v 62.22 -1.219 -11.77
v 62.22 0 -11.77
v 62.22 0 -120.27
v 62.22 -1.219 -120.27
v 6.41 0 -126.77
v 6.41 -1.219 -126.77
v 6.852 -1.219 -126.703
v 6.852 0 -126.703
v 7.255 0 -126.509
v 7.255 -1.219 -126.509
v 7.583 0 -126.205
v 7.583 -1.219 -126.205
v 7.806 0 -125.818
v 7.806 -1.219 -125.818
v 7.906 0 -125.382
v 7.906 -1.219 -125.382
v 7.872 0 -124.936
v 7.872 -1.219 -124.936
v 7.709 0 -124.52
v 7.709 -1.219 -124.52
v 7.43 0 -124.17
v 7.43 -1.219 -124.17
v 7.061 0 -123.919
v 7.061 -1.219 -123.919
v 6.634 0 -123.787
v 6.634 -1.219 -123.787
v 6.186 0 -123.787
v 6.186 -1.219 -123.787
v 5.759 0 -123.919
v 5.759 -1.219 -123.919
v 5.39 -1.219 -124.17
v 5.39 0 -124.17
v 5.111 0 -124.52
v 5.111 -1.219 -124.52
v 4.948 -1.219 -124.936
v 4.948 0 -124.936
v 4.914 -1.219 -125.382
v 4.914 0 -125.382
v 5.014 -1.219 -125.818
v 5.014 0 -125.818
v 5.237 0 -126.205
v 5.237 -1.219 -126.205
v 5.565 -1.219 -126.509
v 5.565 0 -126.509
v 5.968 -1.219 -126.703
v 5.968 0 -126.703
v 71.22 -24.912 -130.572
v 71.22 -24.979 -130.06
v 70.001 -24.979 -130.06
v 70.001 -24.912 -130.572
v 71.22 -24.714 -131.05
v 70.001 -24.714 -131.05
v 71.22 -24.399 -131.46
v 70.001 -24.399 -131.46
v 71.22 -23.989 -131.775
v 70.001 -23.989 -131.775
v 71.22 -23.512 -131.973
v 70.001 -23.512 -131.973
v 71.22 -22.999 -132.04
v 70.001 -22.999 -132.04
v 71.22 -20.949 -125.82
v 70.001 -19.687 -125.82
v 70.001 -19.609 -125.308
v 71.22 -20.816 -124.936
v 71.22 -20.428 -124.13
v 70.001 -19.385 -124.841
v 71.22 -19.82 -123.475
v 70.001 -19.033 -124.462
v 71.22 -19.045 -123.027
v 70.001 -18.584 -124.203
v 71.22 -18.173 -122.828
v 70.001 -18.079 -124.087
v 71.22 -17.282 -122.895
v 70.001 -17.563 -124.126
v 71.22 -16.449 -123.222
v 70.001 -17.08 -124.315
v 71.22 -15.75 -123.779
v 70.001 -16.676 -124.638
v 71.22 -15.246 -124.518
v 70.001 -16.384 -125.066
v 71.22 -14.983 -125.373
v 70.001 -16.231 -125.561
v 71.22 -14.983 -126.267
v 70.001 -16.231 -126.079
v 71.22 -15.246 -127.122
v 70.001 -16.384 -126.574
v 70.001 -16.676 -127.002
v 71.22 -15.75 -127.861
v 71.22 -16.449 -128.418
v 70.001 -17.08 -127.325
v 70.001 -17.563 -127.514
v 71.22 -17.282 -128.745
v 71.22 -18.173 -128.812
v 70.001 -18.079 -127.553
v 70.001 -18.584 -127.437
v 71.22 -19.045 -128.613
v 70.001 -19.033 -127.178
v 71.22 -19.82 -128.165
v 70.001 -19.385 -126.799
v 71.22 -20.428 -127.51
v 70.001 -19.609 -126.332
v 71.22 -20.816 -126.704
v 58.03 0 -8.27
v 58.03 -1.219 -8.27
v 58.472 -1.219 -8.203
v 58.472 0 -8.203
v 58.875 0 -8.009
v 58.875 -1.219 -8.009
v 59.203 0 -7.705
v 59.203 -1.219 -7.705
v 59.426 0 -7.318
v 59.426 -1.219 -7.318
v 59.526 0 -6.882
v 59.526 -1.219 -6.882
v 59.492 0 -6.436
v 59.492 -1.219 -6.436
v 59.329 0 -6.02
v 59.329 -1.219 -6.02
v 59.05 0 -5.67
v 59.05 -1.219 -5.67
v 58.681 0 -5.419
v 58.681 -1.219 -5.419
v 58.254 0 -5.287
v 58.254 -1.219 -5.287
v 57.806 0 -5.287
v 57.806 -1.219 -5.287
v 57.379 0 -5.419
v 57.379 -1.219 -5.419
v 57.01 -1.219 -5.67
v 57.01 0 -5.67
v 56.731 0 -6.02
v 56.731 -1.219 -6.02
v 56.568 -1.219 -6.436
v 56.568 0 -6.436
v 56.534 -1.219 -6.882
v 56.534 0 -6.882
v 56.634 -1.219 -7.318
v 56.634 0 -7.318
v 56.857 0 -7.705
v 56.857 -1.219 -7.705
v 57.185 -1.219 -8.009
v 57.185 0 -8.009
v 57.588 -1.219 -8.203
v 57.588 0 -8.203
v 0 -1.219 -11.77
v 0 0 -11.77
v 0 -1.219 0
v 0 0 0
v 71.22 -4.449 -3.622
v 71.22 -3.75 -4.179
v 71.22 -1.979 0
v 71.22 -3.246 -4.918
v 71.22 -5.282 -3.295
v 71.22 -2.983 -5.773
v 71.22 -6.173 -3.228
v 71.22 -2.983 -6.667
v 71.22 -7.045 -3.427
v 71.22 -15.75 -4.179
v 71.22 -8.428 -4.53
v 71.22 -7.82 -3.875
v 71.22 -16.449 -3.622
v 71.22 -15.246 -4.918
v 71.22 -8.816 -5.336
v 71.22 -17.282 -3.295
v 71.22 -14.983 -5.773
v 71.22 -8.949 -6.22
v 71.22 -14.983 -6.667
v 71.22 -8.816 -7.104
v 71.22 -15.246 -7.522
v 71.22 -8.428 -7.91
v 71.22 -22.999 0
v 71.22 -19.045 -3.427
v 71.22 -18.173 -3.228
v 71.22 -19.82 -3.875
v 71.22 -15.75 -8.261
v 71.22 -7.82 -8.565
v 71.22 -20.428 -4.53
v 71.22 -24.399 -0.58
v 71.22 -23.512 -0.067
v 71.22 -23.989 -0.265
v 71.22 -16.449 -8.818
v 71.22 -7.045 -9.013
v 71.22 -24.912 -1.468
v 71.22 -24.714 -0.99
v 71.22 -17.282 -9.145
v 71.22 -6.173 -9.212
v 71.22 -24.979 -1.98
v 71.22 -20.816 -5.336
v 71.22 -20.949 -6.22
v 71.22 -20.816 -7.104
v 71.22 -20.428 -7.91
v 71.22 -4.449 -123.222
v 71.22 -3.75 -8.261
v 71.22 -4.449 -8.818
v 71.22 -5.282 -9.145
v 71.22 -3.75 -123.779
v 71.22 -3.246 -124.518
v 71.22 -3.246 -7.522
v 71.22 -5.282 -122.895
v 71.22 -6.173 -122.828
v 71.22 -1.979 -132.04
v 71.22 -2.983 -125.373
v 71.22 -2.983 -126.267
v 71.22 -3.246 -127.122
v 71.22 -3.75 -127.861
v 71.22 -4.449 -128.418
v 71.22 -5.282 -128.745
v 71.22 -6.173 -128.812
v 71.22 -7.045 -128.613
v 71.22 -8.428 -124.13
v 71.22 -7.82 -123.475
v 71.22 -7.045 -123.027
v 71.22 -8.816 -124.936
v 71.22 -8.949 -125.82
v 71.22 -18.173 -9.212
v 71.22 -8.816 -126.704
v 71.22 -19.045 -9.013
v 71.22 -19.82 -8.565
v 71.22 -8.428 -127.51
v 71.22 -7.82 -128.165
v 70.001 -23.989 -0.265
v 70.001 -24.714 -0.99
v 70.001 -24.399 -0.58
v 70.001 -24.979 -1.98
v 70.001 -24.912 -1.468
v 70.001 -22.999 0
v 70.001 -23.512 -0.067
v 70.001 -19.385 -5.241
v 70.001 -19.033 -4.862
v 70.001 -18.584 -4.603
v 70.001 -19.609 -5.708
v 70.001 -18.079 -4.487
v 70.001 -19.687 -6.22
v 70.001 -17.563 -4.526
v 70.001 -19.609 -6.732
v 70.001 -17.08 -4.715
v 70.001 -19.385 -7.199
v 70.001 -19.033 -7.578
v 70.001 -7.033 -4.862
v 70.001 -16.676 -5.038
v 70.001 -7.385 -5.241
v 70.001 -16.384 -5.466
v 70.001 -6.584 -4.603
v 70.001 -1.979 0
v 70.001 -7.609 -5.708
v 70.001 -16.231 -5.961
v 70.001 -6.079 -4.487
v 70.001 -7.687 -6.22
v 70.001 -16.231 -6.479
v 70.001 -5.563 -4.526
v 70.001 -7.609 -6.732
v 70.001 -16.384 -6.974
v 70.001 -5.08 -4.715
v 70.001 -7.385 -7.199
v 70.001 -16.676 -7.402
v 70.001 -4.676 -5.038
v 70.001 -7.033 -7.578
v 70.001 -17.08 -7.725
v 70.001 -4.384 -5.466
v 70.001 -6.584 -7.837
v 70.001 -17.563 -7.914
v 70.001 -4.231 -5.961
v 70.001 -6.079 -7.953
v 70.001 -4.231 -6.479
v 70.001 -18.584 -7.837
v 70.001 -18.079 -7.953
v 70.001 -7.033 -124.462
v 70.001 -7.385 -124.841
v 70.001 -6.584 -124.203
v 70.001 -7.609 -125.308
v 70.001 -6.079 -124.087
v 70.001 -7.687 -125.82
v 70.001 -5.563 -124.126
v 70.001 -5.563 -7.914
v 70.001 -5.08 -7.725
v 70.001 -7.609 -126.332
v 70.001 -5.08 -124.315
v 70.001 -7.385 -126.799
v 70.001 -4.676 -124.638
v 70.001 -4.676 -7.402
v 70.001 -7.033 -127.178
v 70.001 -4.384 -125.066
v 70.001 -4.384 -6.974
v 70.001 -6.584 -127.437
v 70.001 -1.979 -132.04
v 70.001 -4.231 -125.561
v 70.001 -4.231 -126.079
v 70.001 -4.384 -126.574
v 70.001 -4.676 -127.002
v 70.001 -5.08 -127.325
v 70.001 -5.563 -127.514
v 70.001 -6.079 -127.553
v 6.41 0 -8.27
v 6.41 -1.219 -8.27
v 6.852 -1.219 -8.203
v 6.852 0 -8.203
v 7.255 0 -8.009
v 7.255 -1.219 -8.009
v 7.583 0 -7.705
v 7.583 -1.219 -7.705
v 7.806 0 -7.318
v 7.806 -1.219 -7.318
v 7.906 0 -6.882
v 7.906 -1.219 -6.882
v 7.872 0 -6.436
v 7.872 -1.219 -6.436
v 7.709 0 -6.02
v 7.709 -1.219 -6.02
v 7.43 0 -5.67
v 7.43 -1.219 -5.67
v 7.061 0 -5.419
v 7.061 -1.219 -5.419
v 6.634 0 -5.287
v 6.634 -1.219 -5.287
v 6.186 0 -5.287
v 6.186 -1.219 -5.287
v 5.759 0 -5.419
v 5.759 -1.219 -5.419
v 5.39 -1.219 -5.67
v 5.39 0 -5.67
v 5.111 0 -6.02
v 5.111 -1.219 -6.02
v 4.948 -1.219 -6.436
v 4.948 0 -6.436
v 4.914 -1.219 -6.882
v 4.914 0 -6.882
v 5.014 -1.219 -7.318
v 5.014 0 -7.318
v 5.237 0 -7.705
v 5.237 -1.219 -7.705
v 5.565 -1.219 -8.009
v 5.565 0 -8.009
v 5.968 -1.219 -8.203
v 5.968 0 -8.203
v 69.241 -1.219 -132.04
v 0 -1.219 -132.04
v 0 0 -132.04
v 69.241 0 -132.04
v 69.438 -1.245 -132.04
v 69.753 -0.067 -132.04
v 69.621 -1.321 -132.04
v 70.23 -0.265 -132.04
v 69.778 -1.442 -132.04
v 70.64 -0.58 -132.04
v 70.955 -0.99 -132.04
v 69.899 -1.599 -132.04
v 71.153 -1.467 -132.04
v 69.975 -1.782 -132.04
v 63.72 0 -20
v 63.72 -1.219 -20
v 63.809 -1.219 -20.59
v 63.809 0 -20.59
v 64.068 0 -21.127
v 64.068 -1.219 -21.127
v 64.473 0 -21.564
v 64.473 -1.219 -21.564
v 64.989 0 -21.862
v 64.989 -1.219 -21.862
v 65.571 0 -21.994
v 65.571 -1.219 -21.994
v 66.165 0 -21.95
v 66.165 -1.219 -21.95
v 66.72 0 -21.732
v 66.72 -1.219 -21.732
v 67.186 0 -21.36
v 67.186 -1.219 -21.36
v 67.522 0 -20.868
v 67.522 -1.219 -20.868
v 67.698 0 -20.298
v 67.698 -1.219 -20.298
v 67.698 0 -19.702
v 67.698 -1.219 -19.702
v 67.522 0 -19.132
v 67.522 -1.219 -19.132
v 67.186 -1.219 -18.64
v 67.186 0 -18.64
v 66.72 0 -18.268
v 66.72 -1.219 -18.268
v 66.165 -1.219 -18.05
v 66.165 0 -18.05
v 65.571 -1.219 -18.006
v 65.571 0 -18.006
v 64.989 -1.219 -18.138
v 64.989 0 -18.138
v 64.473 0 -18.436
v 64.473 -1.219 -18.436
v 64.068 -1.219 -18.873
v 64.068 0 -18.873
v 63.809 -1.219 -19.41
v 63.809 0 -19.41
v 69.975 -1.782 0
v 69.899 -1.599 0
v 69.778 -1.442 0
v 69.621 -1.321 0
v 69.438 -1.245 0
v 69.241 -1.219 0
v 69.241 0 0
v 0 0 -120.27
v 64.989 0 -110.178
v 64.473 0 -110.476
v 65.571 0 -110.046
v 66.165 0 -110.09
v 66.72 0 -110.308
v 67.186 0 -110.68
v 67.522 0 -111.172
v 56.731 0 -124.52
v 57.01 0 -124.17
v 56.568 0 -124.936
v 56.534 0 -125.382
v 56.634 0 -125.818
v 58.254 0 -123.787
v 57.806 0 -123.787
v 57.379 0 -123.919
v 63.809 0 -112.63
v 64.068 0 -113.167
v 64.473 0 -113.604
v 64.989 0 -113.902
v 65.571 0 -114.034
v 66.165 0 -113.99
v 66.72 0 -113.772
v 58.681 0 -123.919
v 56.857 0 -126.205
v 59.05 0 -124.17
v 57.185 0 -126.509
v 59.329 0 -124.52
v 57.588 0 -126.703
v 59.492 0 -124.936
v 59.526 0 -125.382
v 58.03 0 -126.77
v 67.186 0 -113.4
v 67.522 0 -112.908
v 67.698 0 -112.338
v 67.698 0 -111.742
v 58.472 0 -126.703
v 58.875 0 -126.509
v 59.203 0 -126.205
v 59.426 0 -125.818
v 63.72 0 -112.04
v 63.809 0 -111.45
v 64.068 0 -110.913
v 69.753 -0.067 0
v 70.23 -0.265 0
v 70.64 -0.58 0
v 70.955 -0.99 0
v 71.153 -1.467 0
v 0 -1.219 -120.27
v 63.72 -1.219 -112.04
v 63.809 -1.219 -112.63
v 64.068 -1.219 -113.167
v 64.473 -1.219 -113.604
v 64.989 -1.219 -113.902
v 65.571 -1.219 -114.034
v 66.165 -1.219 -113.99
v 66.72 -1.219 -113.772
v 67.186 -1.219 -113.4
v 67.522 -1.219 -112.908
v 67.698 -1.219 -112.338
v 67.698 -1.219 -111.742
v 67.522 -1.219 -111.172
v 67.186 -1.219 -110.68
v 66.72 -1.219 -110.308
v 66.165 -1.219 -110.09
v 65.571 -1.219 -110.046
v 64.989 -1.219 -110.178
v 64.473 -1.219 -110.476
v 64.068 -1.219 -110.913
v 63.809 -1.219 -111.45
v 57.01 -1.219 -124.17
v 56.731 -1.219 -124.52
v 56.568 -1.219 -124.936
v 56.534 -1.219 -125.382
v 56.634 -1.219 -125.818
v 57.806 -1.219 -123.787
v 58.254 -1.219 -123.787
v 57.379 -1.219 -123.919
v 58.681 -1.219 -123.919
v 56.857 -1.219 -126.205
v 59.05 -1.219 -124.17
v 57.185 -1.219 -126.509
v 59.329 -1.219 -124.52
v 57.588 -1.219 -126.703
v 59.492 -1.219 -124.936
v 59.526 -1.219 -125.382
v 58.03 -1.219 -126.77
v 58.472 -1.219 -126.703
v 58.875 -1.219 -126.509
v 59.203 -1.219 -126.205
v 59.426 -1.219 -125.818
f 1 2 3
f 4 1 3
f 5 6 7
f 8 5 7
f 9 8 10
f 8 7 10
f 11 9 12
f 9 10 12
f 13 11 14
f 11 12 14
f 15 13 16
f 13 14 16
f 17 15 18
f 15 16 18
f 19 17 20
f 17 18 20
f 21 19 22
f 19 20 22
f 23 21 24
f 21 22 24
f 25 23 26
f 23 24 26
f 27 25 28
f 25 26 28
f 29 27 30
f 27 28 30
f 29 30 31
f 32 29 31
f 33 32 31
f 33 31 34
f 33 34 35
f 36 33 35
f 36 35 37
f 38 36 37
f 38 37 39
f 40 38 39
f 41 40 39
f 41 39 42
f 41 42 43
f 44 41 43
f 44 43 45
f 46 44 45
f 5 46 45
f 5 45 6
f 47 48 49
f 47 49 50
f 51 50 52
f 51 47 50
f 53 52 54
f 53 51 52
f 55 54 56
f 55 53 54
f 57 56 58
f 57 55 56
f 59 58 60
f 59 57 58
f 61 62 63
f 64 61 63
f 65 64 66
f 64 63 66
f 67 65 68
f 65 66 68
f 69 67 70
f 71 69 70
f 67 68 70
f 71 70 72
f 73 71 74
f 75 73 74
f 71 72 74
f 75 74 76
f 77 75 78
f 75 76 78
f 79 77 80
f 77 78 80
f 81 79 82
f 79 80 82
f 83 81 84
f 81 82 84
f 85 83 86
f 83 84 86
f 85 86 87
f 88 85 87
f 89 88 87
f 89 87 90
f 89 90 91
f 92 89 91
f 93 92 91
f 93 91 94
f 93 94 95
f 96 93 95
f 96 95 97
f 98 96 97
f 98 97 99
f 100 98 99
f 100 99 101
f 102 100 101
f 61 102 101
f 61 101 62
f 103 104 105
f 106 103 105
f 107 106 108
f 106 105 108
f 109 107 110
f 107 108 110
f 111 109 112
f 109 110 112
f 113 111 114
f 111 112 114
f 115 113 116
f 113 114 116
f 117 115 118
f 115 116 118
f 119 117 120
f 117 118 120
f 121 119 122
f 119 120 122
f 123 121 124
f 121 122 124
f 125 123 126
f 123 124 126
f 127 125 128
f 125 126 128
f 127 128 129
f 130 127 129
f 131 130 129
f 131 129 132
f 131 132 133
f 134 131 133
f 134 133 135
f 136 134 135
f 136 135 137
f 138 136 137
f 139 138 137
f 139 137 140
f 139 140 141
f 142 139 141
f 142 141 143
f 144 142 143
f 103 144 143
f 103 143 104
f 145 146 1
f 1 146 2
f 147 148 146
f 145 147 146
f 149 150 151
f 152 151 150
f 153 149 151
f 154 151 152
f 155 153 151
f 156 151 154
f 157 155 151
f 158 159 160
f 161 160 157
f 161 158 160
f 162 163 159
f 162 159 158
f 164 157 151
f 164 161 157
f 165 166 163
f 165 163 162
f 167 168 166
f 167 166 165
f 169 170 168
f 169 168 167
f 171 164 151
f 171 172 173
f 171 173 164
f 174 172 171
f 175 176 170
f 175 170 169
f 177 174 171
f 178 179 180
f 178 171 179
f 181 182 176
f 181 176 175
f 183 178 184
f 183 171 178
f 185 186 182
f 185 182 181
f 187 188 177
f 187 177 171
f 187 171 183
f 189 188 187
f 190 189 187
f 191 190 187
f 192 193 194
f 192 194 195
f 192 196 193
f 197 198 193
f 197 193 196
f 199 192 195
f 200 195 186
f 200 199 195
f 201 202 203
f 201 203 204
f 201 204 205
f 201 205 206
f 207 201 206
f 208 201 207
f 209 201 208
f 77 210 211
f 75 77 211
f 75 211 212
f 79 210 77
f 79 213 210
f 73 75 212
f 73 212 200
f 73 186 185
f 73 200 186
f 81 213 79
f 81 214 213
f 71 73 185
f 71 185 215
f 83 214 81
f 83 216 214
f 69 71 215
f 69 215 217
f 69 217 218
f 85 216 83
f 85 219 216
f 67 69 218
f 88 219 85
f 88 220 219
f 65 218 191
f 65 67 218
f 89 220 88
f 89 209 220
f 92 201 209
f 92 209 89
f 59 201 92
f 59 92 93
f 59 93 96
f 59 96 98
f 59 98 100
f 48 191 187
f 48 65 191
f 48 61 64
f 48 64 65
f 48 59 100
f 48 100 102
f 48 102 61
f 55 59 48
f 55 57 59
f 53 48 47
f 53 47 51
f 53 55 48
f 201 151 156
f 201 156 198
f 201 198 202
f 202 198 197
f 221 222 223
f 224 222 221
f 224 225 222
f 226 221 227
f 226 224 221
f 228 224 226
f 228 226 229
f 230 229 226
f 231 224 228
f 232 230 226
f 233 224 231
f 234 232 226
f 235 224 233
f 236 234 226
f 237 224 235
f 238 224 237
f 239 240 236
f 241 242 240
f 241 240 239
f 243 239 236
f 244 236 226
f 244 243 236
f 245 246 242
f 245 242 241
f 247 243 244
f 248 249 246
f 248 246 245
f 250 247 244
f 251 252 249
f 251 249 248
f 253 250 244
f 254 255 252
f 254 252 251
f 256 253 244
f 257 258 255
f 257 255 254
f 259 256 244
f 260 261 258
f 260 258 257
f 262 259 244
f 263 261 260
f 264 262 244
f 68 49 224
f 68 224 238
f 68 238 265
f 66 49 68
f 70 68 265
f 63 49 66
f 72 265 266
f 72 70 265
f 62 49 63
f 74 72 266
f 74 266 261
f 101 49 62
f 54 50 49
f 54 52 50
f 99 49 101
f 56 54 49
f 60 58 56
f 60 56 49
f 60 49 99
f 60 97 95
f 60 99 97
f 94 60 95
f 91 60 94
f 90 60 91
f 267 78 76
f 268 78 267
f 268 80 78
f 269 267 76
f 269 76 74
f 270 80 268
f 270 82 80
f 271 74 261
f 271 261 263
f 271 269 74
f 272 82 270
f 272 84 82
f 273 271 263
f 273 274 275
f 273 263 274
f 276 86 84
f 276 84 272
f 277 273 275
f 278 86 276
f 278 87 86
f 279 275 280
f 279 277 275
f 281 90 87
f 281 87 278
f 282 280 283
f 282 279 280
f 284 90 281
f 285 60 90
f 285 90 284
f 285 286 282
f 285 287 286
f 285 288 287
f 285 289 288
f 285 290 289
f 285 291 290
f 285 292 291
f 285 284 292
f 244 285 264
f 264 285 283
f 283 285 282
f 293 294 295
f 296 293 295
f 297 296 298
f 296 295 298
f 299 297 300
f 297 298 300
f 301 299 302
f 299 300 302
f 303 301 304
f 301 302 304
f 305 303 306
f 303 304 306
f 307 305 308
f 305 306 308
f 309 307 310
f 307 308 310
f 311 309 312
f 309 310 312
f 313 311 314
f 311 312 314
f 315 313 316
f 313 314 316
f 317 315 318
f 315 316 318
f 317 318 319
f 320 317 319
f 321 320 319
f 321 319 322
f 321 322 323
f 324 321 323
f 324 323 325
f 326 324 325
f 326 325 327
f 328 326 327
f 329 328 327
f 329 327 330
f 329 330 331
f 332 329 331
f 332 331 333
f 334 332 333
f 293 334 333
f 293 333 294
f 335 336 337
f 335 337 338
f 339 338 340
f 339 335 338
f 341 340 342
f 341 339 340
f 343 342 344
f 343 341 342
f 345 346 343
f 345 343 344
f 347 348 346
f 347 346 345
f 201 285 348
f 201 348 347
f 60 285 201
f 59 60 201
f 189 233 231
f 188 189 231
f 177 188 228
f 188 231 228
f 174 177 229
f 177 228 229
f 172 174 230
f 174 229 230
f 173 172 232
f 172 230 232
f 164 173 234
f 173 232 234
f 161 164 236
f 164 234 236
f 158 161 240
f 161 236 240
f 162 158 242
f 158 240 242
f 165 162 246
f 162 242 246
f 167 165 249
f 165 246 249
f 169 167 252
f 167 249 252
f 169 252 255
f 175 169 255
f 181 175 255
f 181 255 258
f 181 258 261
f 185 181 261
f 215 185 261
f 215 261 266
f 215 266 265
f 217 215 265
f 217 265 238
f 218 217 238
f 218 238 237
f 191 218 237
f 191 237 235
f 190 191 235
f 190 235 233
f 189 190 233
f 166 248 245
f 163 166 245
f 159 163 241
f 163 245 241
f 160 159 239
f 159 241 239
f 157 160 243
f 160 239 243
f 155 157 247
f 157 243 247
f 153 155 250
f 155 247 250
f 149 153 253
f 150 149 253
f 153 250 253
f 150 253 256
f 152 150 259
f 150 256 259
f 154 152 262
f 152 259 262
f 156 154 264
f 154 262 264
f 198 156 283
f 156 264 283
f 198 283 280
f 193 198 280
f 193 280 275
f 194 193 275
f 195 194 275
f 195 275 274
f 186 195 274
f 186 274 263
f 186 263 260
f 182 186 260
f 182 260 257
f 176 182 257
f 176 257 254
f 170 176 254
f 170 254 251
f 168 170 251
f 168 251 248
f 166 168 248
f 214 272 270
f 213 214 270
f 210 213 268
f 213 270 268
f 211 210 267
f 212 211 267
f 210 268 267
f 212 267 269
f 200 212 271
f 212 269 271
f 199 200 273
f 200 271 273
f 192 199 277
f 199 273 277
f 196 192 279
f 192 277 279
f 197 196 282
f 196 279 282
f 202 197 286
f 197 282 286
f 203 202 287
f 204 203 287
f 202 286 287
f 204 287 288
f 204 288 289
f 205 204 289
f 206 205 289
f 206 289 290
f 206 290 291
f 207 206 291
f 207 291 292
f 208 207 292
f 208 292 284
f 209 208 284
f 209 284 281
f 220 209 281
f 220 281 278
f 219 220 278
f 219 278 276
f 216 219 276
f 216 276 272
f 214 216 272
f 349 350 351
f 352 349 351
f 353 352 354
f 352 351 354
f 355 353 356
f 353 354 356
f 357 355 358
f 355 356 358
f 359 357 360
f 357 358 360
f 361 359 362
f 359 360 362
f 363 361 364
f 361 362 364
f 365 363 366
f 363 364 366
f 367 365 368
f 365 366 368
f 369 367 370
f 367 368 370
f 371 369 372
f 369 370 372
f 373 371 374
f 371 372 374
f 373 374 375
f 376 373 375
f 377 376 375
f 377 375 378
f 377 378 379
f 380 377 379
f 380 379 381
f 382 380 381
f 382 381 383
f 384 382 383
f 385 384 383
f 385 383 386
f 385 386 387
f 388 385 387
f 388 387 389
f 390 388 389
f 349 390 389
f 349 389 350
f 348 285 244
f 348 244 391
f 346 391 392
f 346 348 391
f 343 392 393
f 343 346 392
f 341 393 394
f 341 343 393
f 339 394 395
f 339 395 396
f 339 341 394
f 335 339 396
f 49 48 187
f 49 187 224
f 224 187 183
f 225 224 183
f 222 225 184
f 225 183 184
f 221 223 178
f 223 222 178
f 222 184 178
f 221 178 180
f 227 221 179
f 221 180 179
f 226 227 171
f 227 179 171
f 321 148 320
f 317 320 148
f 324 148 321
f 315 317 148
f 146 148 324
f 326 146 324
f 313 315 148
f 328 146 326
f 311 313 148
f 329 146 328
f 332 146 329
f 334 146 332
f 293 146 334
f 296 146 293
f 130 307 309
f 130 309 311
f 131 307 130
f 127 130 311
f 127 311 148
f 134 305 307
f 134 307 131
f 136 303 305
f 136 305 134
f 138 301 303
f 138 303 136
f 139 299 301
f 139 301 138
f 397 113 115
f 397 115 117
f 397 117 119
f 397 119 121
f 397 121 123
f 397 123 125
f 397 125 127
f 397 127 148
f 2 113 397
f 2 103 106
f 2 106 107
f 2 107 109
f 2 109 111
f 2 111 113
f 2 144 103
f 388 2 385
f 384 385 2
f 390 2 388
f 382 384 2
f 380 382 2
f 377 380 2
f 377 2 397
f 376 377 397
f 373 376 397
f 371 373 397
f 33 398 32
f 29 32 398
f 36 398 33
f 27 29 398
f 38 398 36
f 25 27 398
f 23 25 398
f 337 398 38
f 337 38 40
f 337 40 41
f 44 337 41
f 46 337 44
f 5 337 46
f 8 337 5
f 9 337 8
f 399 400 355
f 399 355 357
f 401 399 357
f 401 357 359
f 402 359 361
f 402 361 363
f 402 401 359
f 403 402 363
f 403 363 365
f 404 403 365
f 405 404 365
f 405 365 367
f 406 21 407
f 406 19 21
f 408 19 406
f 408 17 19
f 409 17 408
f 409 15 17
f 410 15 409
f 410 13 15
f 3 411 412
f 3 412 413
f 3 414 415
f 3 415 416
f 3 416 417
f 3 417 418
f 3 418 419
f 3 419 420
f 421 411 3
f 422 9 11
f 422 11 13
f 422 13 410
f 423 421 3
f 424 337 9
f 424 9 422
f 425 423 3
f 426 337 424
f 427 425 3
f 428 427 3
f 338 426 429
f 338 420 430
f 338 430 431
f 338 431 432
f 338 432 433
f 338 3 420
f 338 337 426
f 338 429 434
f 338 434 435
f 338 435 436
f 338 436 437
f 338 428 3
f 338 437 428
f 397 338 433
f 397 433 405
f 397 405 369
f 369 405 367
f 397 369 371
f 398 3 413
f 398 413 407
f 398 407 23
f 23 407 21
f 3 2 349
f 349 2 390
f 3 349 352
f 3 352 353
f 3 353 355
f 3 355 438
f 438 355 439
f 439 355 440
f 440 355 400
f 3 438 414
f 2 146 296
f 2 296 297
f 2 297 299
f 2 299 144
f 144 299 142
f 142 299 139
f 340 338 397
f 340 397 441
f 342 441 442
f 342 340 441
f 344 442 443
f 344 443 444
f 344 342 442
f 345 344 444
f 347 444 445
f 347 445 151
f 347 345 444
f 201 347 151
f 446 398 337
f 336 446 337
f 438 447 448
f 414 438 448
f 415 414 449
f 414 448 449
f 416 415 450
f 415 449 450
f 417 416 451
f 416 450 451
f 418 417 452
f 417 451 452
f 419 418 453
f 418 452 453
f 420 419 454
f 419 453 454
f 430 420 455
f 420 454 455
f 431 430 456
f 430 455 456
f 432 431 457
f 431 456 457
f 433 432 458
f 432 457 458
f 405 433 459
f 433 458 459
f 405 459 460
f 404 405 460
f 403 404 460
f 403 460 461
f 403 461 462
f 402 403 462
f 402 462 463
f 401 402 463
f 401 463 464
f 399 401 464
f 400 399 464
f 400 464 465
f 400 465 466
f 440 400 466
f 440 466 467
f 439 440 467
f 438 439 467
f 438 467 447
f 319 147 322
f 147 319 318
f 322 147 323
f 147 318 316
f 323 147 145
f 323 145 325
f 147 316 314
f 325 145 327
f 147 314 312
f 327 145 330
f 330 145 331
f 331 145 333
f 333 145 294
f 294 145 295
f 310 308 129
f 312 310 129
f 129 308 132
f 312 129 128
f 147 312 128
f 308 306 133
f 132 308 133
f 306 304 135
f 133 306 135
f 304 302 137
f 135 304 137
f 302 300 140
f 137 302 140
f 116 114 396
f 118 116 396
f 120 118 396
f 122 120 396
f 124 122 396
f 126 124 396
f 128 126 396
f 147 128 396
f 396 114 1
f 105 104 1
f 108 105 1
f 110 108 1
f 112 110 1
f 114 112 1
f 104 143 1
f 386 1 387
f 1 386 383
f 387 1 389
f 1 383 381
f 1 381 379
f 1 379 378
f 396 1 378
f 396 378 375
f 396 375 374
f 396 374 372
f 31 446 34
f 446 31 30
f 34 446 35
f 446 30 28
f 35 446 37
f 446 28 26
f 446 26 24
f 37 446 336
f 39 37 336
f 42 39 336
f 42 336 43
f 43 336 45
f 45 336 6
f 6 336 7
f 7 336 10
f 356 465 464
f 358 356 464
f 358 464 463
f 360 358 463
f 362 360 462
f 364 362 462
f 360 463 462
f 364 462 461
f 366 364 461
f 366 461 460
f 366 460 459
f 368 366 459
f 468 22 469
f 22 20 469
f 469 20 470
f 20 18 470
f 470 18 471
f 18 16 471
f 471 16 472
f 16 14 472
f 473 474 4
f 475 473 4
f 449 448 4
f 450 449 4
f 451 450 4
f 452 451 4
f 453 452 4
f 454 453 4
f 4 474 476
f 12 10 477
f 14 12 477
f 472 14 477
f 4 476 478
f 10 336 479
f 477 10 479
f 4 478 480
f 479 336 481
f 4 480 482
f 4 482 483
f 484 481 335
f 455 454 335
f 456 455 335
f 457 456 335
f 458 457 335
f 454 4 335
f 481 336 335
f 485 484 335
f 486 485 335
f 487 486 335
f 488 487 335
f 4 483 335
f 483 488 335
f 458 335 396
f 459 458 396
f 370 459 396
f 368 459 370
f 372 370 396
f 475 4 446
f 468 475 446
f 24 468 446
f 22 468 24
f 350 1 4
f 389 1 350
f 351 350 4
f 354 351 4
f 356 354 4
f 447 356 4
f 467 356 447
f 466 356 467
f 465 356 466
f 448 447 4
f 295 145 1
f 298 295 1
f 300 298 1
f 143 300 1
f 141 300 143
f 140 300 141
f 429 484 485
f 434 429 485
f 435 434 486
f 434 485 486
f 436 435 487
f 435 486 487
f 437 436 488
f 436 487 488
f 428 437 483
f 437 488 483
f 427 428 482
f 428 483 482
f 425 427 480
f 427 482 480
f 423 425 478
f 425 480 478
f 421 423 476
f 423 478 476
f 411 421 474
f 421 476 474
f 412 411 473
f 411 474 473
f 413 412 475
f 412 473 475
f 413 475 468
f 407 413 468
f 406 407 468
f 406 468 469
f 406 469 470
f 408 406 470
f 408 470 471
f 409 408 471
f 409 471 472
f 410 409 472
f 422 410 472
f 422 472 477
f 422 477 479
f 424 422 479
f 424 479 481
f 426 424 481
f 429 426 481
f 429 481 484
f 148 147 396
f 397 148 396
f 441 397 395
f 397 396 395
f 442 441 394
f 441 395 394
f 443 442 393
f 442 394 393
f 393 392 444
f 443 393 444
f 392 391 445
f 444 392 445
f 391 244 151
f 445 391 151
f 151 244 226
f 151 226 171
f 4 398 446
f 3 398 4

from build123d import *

# Parameters (mm, degrees)
SKETCH1_W                                            = 71.22
SKETCH1_H                                            = 132.04
BASE_FLANGE1_DEPTH                                   = 1.2192
EDGE_FLANGE1_STRIP_W                                 = 6.3968
EDGE_FLANGE1_STRIP_H                                 = 1.2192
EDGE_FLANGE1_STRIP_CUT_DEPTH                         = 132.04
EDGE_FLANGE1_DEPTH                                   = 132.04
CUT_EXTRUDE2_REACH                                   = 154.088
SKETCH28_W                                           = 62.22
SKETCH28_H                                           = 108.5
CSK_FOR_M3_CROSS_COUNTERSUNK_HEAD_SCREW4_D           = 3.4
CSK_FOR_M3_CROSS_COUNTERSUNK_HEAD_SCREW4_CSINK_D     = 6
CSK_FOR_M3_CROSS_COUNTERSUNK_HEAD_SCREW4_CSINK_ANGLE = 92
F_3_0MM_DOWEL_HOLE1_D                                = 3
CUT_EXTRUDE3_REACH                                   = 154.088
F_4_0MM_DOWEL_HOLE1_D                                = 4


# Sheet-metal steps are written as plain solids
with BuildPart() as part:
    # Sketch1 → Base-Flange1 (new body)
    with BuildSketch(Plane(origin=(0, 0, 0), x_dir=(1, 0, 0), z_dir=(0, 1, 0))):
        with Locations((35.61, 66.02)):
            Rectangle(SKETCH1_W, SKETCH1_H)
    extrude(amount=-BASE_FLANGE1_DEPTH)

    # Edge-Flange1 strip (across the edge) → Edge-Flange1 strip cut (cut)
    with BuildSketch(Plane(origin=(71.22, -1.2192, -132.04), x_dir=(-1, 0, 0), z_dir=(0, 0, 1))):
        with Locations((-1.2192, -0.6096)):
            Rectangle(EDGE_FLANGE1_STRIP_W, EDGE_FLANGE1_STRIP_H)
    extrude(amount=EDGE_FLANGE1_STRIP_CUT_DEPTH, mode=Mode.SUBTRACT)

    # Edge-Flange1 section (across the edge) → Edge-Flange1 (add)
    with BuildSketch(Plane(origin=(71.22, -1.2192, -132.04), x_dir=(-1, 0, 0), z_dir=(0, 0, 1))):
        with BuildLine():
            Line((0, 0.76), (0, 23.76))
            Line((0, 23.76), (1.2192, 23.76))
            Line((1.2192, 23.76), (1.2192, 0.76))
            ThreePointArc((1.2192, 0.76), (1.441798846, 0.222598846), (1.9792, 0))
            Line((1.9792, 0), (1.9792, -1.2192))
            ThreePointArc((1.9792, -1.2192), (0.579694259, -0.639505741), (0, 0.76))
        make_face()
    extrude(amount=EDGE_FLANGE1_DEPTH)

    # Sketch28 → Cut-Extrude2 (cut, up to next)
    with BuildSketch(Plane(origin=(0, 0, 0), x_dir=(1, 0, 0), z_dir=(0, 1, 0)), mode=Mode.PRIVATE) as cut_extrude2_sk1:
        with Locations((31.11, 66.02)):
            Rectangle(SKETCH28_W, SKETCH28_H)
    cut_extrude2_tool1 = extrude(cut_extrude2_sk1.sketch, amount=-CUT_EXTRUDE2_REACH, mode=Mode.PRIVATE) & part.part
    add(cut_extrude2_tool1.solids().sort_by_distance((31.11, 0, -66.02))[0], mode=Mode.SUBTRACT)

    # CSK for M3 Cross Countersunk Head Screw4 (through all)
    with Locations(Plane(origin=(71.22, -5.9492, -6.22), x_dir=(0, 1, 0), z_dir=(1, 0, 0))):
        with Locations((0, 0), (-12, 0), (0, -119.6), (-12, -119.6)):
            CounterSinkHole(CSK_FOR_M3_CROSS_COUNTERSUNK_HEAD_SCREW4_D / 2, CSK_FOR_M3_CROSS_COUNTERSUNK_HEAD_SCREW4_CSINK_D / 2, counter_sink_angle=CSK_FOR_M3_CROSS_COUNTERSUNK_HEAD_SCREW4_CSINK_ANGLE)

    # Ø3.0mm Dowel Hole1 (through all)
    with Locations(Plane(origin=(6.41, 0, -125.27), x_dir=(0, 0, 1), z_dir=(0, 1, 0))):
        with Locations((0, 0), (0, 51.62), (118.5, 51.62), (118.5, 0)):
            Hole(F_3_0MM_DOWEL_HOLE1_D / 2)

    # Sketch35 → Cut-Extrude3 (cut, up to next)
    with BuildSketch(Plane(origin=(71.22, 0, 0), x_dir=(0, 0, -1), z_dir=(1, 0, 0)), mode=Mode.PRIVATE) as cut_extrude3_sk1:
        with BuildLine():
            Line((0, -24.9792), (1.98, -24.9792))
            ThreePointArc((1.98, -24.9792), (0.579928573, -24.399271427), (0, -22.9992))
            Line((0, -22.9992), (0, -24.9792))
        make_face()
    cut_extrude3_tool1 = extrude(cut_extrude3_sk1.sketch, amount=-CUT_EXTRUDE3_REACH, mode=Mode.PRIVATE) & part.part
    # Sketch35 → Cut-Extrude3 (cut, up to next)
    with BuildSketch(Plane(origin=(71.22, 0, 0), x_dir=(0, 0, -1), z_dir=(1, 0, 0)), mode=Mode.PRIVATE) as cut_extrude3_sk2:
        with BuildLine():
            Line((132.04, -24.9792), (130.06, -24.9792))
            ThreePointArc((130.06, -24.9792), (131.460071427, -24.399271427), (132.04, -22.9992))
            Line((132.04, -22.9992), (132.04, -24.9792))
        make_face()
    cut_extrude3_tool2 = extrude(cut_extrude3_sk2.sketch, amount=-CUT_EXTRUDE3_REACH, mode=Mode.PRIVATE) & part.part
    add(cut_extrude3_tool1.solids().sort_by_distance((71.22, -24.536931, -0.442269))[0], mode=Mode.SUBTRACT)
    add(cut_extrude3_tool2.solids().sort_by_distance((71.22, -24.536931, -131.597731))[0], mode=Mode.SUBTRACT)

    # Ø4.0mm Dowel Hole1 (through all)
    with Locations(Plane(origin=(0, 0, 0), x_dir=(1, 0, 0), z_dir=(0, 1, 0))):
        with Locations((65.72, 112.04), (65.72, 20)):
            Hole(F_4_0MM_DOWEL_HOLE1_D / 2)


solid = part.part
